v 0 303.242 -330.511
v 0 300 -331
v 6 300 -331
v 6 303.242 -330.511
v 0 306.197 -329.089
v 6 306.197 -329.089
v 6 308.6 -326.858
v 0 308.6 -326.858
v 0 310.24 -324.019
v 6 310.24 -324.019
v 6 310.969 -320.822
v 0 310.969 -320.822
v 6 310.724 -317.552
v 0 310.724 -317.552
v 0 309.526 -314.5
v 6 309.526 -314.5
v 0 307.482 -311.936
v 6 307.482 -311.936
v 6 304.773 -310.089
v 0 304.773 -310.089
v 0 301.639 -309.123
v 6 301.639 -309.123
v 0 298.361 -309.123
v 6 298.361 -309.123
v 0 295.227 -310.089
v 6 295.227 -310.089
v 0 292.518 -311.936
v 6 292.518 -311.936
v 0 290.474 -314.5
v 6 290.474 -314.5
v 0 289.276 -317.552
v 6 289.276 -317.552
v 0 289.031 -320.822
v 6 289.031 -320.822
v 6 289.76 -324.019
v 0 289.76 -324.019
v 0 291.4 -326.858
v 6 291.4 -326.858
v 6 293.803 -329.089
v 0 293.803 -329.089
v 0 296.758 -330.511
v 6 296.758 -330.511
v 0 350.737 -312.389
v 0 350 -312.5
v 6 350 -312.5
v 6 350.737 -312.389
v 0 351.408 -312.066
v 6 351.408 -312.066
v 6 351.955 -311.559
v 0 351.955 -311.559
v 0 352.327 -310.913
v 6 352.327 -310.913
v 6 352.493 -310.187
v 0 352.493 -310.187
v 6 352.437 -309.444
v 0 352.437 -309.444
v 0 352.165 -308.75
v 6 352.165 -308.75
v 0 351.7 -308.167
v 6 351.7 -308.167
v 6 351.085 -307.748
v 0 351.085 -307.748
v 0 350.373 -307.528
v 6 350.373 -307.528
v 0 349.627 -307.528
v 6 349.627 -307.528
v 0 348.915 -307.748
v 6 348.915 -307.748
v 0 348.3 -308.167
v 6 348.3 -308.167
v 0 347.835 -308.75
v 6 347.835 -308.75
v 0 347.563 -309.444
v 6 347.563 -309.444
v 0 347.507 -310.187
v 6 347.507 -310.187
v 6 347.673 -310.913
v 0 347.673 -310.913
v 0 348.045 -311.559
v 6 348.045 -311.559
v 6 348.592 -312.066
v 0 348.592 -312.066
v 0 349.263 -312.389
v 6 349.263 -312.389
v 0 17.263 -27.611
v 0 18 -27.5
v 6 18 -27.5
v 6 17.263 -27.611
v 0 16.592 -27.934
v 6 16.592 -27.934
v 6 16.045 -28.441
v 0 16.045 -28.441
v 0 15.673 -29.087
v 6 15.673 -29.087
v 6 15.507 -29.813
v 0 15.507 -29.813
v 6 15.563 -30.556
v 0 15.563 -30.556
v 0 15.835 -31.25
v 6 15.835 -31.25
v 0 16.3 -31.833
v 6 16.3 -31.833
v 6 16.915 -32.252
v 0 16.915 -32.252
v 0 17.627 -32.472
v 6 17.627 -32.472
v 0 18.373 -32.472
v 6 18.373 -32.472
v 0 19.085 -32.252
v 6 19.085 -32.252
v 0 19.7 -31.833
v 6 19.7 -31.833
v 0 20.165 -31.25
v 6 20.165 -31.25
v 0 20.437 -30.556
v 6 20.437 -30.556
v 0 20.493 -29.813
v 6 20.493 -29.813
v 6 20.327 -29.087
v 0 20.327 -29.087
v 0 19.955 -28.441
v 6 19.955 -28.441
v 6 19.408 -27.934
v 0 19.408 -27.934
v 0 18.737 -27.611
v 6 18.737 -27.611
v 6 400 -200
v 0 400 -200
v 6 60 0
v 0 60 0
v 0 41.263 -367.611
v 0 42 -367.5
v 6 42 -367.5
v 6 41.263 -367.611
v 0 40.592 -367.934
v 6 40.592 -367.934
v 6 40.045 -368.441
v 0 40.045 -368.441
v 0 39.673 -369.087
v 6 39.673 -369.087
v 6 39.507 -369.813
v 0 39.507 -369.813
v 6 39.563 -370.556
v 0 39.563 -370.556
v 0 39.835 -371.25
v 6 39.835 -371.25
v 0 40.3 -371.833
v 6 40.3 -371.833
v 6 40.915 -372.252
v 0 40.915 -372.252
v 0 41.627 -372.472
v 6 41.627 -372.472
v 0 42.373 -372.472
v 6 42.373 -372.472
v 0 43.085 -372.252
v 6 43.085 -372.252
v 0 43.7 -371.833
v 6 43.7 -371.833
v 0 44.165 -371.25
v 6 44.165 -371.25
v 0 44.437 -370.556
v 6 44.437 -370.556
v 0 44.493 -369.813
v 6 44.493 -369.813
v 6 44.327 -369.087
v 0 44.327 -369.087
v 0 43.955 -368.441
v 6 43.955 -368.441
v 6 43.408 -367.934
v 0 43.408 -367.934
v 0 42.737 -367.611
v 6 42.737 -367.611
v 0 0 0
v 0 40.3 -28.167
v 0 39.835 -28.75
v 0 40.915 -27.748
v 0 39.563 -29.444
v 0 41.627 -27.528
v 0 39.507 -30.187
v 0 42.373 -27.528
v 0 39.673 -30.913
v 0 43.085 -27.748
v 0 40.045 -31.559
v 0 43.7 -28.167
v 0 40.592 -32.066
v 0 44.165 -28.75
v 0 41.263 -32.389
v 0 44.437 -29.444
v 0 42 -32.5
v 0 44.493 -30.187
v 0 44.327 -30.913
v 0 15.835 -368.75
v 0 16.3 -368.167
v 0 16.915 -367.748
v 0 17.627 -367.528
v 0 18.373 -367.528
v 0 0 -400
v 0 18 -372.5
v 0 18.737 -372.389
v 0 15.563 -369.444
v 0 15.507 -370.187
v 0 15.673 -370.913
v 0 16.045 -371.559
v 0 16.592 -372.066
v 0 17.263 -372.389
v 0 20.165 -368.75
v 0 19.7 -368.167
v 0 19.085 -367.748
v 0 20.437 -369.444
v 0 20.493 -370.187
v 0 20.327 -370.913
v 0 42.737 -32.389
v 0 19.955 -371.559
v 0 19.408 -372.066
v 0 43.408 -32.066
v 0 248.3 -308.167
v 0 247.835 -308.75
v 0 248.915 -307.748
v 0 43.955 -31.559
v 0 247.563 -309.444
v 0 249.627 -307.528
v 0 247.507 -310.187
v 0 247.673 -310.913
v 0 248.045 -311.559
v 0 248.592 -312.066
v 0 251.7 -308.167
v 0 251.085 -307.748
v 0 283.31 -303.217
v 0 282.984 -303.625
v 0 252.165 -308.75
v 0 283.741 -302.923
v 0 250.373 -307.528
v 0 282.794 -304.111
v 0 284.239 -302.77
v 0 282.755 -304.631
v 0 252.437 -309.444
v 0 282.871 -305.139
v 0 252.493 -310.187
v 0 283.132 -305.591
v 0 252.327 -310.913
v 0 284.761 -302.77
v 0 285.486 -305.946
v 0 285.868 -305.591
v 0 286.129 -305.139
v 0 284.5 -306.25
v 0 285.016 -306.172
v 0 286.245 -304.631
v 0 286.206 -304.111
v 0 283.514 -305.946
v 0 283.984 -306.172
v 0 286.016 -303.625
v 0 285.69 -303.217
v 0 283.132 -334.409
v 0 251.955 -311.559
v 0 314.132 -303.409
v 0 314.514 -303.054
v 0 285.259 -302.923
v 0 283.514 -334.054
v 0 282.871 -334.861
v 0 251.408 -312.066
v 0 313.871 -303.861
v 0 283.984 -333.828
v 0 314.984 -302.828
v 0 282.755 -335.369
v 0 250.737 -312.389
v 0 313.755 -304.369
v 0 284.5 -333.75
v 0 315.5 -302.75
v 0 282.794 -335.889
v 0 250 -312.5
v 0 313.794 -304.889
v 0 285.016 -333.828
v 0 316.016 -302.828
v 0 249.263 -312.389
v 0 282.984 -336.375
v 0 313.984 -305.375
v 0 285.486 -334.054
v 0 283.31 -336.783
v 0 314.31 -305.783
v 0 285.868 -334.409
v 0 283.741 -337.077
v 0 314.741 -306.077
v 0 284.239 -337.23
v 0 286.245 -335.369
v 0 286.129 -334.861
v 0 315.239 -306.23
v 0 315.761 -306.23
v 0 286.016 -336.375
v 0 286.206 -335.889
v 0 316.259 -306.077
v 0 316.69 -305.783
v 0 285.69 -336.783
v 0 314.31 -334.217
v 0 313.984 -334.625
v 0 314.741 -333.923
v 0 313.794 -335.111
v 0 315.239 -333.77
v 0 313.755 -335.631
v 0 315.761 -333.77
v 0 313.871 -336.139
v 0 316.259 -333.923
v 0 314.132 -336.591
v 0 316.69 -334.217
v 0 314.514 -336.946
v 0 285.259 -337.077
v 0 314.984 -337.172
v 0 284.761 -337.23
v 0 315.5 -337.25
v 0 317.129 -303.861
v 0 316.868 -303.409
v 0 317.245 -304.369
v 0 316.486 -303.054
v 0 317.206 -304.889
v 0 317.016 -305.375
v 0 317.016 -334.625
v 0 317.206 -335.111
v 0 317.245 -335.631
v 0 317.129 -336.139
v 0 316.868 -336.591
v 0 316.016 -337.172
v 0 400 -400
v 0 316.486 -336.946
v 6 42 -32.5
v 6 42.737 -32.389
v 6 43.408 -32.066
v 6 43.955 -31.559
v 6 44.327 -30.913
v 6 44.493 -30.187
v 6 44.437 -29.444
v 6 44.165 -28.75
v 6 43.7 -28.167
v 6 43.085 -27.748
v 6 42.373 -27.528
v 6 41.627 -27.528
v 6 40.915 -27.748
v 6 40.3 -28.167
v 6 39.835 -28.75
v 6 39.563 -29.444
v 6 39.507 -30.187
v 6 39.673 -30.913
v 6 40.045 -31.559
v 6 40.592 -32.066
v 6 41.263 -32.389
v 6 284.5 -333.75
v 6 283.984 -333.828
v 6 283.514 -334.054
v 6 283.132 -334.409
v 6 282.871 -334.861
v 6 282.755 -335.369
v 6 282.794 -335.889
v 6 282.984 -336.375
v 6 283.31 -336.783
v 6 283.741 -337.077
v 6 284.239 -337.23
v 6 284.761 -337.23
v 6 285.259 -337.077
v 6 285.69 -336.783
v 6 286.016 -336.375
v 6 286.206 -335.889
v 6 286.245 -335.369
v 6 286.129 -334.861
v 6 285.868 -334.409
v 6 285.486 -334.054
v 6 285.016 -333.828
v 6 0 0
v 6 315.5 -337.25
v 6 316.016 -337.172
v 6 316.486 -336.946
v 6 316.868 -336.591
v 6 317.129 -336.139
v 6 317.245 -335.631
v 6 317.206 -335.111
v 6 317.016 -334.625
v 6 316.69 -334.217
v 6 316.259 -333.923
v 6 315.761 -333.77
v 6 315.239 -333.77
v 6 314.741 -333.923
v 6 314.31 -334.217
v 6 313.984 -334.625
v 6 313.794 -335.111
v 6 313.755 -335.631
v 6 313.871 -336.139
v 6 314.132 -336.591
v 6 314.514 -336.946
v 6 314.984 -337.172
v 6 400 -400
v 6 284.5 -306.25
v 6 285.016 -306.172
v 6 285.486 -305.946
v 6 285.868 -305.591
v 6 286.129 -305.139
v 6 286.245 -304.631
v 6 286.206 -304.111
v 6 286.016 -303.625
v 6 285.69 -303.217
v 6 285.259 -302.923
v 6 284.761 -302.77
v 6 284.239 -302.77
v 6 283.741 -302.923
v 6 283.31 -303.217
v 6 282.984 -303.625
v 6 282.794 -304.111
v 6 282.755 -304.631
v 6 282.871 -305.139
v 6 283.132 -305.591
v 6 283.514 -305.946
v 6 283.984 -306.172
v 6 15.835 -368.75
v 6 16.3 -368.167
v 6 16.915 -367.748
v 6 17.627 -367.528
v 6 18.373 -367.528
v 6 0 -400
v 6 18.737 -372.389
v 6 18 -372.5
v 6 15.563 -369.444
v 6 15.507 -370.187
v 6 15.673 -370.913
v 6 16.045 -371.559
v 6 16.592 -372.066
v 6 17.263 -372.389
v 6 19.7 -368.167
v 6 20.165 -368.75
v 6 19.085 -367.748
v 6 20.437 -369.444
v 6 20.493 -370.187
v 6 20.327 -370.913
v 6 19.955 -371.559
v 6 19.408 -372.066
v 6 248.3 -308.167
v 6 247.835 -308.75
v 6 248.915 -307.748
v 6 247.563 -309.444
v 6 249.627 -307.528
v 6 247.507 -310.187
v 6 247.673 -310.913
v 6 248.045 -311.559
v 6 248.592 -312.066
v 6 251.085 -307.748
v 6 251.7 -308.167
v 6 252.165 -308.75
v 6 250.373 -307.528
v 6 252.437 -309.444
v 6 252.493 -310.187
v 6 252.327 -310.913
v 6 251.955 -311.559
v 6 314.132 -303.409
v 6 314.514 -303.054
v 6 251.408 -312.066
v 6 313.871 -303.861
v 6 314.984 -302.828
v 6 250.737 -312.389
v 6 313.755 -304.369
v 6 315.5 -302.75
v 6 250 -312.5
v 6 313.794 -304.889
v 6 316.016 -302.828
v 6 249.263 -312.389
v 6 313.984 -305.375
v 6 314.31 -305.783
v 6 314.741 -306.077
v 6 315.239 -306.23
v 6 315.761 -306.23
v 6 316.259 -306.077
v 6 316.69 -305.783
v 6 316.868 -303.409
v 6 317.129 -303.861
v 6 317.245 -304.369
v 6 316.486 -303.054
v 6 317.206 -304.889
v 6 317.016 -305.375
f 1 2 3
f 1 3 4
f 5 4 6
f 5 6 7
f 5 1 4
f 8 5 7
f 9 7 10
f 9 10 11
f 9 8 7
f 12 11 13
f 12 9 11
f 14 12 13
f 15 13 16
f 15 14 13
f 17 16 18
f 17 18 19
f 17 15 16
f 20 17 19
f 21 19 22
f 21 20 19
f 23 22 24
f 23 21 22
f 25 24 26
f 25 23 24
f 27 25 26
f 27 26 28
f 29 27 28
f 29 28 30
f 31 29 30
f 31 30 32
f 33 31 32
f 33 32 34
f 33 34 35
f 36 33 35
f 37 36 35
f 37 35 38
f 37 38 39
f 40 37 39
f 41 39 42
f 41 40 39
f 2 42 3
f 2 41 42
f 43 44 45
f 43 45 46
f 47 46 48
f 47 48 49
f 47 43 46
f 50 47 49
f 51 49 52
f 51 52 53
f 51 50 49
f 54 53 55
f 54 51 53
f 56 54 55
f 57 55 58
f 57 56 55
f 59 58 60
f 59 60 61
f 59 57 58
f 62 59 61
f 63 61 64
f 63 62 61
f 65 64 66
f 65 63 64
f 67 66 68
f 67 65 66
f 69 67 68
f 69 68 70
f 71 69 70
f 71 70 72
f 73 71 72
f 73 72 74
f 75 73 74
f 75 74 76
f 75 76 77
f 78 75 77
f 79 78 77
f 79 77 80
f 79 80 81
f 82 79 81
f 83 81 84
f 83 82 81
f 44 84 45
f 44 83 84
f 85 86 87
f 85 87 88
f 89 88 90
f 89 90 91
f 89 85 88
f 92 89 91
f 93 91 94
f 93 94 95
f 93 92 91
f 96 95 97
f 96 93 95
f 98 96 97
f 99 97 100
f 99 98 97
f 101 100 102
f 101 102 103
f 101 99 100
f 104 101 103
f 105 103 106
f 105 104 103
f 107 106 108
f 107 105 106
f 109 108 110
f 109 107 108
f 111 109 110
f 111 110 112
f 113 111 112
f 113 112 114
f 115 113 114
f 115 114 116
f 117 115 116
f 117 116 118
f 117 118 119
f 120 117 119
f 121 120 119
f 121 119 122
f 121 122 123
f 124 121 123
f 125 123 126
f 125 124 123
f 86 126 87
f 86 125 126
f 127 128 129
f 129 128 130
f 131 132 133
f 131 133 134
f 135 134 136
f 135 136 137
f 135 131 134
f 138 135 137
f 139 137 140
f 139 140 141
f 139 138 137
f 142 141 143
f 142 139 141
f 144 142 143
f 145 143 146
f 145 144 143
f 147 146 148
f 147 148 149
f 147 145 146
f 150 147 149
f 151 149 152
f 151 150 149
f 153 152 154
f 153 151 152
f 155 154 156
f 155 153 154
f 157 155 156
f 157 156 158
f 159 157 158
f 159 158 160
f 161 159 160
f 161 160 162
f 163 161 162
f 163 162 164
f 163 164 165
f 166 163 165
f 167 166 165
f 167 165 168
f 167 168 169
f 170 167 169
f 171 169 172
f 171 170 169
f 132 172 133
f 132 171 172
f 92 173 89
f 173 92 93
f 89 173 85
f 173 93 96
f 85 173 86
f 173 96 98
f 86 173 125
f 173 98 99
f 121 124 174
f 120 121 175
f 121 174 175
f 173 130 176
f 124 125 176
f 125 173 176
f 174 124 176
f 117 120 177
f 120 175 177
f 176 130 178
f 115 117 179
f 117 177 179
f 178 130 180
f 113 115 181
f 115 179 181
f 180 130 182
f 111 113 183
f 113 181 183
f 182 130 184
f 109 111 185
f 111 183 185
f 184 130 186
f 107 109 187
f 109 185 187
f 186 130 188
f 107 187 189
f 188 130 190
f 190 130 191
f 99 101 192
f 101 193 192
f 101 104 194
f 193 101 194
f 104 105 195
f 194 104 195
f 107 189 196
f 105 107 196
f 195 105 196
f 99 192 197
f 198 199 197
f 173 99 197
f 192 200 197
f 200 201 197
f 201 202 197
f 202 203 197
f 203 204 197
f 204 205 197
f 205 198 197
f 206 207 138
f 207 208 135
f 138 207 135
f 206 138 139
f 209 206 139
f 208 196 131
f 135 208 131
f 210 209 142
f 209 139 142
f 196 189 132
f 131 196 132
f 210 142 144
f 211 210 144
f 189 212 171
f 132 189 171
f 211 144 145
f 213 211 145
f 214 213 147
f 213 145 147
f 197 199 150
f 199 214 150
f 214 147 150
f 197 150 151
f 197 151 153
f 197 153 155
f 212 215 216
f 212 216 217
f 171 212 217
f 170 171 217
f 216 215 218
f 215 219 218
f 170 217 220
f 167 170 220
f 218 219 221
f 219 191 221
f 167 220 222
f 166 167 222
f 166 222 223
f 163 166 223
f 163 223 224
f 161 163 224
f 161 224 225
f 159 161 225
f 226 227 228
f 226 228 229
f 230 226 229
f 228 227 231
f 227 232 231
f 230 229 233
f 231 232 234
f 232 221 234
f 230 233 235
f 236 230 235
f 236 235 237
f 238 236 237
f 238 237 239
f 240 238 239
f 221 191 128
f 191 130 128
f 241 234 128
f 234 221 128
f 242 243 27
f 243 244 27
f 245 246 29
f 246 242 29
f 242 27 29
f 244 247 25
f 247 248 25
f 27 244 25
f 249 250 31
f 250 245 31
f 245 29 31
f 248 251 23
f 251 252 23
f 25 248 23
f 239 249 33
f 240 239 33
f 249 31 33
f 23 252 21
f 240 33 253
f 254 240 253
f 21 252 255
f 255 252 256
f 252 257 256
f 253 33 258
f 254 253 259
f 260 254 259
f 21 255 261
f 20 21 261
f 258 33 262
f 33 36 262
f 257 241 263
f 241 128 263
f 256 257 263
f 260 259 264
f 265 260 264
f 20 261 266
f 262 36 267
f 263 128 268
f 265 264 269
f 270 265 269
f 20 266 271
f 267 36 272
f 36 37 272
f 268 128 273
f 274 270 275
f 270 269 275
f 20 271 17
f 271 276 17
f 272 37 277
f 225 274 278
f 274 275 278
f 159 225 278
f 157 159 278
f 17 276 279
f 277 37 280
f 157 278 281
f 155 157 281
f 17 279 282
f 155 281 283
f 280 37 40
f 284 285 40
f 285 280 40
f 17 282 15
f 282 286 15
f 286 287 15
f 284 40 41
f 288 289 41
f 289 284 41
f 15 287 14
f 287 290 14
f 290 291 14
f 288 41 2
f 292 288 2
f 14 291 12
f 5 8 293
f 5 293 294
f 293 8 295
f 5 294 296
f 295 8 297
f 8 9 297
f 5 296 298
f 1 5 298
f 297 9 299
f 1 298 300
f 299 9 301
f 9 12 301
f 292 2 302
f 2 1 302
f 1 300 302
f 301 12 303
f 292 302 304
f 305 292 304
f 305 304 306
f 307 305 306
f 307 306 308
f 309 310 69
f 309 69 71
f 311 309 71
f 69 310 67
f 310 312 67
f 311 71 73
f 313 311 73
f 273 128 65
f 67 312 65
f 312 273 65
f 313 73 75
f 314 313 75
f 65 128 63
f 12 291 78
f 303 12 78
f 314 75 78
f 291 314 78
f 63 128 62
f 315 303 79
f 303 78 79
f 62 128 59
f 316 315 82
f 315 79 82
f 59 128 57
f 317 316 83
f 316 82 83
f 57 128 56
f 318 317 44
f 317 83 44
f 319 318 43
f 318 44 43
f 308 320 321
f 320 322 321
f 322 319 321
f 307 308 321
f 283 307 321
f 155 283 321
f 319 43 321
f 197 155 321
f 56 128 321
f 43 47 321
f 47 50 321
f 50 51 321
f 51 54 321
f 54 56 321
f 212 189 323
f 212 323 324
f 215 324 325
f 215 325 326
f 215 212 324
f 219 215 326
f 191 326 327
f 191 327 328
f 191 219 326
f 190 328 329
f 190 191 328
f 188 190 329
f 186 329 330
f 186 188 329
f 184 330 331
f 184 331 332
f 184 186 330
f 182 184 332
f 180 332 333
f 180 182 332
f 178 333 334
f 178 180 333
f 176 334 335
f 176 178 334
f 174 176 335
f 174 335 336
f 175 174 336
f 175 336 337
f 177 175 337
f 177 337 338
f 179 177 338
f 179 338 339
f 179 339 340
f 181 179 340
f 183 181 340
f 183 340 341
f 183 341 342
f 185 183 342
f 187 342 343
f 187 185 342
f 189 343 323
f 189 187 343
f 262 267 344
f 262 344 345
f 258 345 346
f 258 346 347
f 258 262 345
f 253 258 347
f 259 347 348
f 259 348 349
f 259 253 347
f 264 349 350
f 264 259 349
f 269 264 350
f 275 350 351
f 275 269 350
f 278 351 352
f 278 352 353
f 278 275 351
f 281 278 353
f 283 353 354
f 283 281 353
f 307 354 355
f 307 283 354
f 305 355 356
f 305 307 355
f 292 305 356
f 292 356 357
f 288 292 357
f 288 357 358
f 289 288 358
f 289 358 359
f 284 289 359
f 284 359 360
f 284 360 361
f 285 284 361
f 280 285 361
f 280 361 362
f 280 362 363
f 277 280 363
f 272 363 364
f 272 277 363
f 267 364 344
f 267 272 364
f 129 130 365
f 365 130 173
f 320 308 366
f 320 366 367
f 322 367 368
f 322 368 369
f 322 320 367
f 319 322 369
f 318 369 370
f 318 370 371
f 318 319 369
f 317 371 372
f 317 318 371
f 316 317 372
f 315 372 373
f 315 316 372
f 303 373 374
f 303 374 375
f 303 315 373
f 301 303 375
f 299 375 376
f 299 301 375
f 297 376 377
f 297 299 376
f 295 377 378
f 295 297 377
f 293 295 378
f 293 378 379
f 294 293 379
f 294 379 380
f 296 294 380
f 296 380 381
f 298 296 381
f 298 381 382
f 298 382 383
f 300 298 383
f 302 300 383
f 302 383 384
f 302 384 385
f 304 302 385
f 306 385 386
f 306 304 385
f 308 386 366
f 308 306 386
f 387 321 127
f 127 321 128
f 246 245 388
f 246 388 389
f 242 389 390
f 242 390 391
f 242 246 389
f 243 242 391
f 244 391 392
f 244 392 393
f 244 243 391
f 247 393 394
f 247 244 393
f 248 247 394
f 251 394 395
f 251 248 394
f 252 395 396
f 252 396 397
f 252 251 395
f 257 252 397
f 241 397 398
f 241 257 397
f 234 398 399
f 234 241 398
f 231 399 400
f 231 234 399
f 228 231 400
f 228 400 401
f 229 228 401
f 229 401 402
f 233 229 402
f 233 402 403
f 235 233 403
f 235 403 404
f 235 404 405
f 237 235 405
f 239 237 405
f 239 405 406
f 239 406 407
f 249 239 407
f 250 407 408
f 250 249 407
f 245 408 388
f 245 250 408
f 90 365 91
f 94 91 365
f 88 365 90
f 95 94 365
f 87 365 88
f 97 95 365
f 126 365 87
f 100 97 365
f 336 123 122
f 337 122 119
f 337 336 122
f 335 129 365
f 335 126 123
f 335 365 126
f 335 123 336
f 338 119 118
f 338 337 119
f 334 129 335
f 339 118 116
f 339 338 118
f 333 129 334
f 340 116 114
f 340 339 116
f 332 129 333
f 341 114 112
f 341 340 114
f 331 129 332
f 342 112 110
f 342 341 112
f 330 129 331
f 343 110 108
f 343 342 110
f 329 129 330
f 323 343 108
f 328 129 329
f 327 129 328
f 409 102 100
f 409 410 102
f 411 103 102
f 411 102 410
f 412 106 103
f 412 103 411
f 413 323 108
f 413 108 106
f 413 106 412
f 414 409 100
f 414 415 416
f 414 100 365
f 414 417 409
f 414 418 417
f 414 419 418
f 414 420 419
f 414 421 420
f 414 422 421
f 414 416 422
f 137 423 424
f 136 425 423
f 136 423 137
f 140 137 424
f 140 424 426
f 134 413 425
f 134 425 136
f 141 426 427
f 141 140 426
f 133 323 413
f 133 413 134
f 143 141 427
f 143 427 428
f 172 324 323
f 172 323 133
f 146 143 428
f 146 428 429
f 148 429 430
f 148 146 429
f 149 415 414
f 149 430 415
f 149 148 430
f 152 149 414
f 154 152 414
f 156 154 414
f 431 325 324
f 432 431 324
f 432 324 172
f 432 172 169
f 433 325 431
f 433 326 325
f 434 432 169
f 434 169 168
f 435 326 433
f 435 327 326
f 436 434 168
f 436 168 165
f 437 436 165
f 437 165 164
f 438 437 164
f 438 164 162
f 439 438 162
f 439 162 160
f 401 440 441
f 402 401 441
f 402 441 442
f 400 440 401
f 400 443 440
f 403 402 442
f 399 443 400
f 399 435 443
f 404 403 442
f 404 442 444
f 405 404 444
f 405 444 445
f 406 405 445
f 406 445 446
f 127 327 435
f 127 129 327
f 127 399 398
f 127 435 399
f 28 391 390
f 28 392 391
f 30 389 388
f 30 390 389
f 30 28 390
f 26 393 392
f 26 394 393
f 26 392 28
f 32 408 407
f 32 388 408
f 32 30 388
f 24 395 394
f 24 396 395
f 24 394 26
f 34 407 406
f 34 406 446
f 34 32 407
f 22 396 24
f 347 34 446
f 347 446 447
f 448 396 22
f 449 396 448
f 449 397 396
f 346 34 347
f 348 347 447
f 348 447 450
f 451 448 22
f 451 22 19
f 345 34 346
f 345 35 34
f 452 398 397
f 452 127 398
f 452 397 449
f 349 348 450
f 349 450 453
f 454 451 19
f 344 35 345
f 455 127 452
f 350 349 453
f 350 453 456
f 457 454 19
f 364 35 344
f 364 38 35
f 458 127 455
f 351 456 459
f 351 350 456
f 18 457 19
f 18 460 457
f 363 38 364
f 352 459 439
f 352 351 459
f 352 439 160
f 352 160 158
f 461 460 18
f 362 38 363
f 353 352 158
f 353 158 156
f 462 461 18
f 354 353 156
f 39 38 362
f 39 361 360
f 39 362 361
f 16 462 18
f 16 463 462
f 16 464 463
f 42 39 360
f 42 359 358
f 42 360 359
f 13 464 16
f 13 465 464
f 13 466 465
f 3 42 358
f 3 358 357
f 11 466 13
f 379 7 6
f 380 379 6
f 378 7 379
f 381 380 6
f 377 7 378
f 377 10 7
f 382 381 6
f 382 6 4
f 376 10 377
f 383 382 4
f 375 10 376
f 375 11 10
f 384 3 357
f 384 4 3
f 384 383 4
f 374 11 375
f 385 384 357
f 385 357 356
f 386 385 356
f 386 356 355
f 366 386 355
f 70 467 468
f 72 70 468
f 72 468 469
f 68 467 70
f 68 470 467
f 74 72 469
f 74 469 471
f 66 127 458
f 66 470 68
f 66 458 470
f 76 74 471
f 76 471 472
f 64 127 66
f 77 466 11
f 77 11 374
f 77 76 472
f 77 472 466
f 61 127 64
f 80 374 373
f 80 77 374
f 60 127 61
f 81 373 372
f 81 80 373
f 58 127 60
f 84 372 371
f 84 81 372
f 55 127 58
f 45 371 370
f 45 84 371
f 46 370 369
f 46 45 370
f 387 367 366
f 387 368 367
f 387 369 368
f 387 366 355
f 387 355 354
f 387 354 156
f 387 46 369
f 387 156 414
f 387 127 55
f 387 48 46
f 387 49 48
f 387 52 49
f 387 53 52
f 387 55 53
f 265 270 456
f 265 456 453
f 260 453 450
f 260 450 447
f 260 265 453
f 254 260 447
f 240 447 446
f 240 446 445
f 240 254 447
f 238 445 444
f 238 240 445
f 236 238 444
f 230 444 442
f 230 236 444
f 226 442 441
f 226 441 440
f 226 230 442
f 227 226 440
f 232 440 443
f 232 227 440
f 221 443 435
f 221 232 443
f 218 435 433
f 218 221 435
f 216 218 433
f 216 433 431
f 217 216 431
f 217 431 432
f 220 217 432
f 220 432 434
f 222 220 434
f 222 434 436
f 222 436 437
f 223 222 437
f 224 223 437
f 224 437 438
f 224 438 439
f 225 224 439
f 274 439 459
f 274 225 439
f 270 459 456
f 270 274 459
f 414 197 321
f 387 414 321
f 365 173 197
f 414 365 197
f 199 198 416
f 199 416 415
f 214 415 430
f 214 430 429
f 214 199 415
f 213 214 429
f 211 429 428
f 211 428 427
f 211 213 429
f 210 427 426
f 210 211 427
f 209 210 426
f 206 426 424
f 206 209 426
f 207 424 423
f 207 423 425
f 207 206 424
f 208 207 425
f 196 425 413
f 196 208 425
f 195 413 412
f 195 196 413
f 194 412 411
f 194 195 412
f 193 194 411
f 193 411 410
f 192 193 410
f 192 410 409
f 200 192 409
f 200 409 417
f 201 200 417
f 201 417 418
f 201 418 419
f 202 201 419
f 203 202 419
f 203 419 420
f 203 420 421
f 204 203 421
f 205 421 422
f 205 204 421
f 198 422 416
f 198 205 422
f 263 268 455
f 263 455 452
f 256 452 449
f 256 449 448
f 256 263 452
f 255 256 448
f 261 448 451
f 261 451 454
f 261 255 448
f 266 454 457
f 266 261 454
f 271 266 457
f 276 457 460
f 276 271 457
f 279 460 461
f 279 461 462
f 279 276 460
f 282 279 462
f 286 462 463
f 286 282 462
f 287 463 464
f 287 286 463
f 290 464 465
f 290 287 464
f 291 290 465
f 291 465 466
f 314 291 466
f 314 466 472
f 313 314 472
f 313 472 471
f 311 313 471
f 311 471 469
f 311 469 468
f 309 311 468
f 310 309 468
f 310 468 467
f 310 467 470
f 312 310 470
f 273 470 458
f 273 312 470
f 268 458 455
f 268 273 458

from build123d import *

# Parameters (mm, degrees)
SKETCH1_R           = 2.5
SKETCH1_R_2         = 11
SKETCH1_R_3         = 1.75
BOSS_EXTRUDE1_DEPTH = 6


with BuildPart() as part:
    # Sketch1 → Boss-Extrude1 (new body)
    with BuildSketch(Plane(origin=(0, 0, 0), x_dir=(0, 0, -1), z_dir=(1, 0, 0))):
        Polygon((0, 0), (400, 0), (400, 400), (200, 400), (0, 60), align=None)
        with Locations((30, 42)):
            Circle(SKETCH1_R, mode=Mode.SUBTRACT)
        with Locations(Location((30, 18, 0), (0, 0, 180))):
            Circle(SKETCH1_R, mode=Mode.SUBTRACT)
        with Locations((370, 18)):
            Circle(SKETCH1_R, mode=Mode.SUBTRACT)
        with Locations(Location((370, 42, 0), (0, 0, 180))):
            Circle(SKETCH1_R, mode=Mode.SUBTRACT)
        with Locations((310, 350)):
            Circle(SKETCH1_R, mode=Mode.SUBTRACT)
        with Locations((310, 250)):
            Circle(SKETCH1_R, mode=Mode.SUBTRACT)
        with Locations((320, 300)):
            Circle(SKETCH1_R_2, mode=Mode.SUBTRACT)
        with Locations((335.5, 315.5)):
            Circle(SKETCH1_R_3, mode=Mode.SUBTRACT)
        with Locations(Location((304.5, 315.5, 0), (0, 0, 180))):
            Circle(SKETCH1_R_3, mode=Mode.SUBTRACT)
        with Locations((304.5, 284.5)):
            Circle(SKETCH1_R_3, mode=Mode.SUBTRACT)
        with Locations(Location((335.5, 284.5, 0), (0, 0, 180))):
            Circle(SKETCH1_R_3, mode=Mode.SUBTRACT)
    extrude(amount=BOSS_EXTRUDE1_DEPTH)


solid = part.part
